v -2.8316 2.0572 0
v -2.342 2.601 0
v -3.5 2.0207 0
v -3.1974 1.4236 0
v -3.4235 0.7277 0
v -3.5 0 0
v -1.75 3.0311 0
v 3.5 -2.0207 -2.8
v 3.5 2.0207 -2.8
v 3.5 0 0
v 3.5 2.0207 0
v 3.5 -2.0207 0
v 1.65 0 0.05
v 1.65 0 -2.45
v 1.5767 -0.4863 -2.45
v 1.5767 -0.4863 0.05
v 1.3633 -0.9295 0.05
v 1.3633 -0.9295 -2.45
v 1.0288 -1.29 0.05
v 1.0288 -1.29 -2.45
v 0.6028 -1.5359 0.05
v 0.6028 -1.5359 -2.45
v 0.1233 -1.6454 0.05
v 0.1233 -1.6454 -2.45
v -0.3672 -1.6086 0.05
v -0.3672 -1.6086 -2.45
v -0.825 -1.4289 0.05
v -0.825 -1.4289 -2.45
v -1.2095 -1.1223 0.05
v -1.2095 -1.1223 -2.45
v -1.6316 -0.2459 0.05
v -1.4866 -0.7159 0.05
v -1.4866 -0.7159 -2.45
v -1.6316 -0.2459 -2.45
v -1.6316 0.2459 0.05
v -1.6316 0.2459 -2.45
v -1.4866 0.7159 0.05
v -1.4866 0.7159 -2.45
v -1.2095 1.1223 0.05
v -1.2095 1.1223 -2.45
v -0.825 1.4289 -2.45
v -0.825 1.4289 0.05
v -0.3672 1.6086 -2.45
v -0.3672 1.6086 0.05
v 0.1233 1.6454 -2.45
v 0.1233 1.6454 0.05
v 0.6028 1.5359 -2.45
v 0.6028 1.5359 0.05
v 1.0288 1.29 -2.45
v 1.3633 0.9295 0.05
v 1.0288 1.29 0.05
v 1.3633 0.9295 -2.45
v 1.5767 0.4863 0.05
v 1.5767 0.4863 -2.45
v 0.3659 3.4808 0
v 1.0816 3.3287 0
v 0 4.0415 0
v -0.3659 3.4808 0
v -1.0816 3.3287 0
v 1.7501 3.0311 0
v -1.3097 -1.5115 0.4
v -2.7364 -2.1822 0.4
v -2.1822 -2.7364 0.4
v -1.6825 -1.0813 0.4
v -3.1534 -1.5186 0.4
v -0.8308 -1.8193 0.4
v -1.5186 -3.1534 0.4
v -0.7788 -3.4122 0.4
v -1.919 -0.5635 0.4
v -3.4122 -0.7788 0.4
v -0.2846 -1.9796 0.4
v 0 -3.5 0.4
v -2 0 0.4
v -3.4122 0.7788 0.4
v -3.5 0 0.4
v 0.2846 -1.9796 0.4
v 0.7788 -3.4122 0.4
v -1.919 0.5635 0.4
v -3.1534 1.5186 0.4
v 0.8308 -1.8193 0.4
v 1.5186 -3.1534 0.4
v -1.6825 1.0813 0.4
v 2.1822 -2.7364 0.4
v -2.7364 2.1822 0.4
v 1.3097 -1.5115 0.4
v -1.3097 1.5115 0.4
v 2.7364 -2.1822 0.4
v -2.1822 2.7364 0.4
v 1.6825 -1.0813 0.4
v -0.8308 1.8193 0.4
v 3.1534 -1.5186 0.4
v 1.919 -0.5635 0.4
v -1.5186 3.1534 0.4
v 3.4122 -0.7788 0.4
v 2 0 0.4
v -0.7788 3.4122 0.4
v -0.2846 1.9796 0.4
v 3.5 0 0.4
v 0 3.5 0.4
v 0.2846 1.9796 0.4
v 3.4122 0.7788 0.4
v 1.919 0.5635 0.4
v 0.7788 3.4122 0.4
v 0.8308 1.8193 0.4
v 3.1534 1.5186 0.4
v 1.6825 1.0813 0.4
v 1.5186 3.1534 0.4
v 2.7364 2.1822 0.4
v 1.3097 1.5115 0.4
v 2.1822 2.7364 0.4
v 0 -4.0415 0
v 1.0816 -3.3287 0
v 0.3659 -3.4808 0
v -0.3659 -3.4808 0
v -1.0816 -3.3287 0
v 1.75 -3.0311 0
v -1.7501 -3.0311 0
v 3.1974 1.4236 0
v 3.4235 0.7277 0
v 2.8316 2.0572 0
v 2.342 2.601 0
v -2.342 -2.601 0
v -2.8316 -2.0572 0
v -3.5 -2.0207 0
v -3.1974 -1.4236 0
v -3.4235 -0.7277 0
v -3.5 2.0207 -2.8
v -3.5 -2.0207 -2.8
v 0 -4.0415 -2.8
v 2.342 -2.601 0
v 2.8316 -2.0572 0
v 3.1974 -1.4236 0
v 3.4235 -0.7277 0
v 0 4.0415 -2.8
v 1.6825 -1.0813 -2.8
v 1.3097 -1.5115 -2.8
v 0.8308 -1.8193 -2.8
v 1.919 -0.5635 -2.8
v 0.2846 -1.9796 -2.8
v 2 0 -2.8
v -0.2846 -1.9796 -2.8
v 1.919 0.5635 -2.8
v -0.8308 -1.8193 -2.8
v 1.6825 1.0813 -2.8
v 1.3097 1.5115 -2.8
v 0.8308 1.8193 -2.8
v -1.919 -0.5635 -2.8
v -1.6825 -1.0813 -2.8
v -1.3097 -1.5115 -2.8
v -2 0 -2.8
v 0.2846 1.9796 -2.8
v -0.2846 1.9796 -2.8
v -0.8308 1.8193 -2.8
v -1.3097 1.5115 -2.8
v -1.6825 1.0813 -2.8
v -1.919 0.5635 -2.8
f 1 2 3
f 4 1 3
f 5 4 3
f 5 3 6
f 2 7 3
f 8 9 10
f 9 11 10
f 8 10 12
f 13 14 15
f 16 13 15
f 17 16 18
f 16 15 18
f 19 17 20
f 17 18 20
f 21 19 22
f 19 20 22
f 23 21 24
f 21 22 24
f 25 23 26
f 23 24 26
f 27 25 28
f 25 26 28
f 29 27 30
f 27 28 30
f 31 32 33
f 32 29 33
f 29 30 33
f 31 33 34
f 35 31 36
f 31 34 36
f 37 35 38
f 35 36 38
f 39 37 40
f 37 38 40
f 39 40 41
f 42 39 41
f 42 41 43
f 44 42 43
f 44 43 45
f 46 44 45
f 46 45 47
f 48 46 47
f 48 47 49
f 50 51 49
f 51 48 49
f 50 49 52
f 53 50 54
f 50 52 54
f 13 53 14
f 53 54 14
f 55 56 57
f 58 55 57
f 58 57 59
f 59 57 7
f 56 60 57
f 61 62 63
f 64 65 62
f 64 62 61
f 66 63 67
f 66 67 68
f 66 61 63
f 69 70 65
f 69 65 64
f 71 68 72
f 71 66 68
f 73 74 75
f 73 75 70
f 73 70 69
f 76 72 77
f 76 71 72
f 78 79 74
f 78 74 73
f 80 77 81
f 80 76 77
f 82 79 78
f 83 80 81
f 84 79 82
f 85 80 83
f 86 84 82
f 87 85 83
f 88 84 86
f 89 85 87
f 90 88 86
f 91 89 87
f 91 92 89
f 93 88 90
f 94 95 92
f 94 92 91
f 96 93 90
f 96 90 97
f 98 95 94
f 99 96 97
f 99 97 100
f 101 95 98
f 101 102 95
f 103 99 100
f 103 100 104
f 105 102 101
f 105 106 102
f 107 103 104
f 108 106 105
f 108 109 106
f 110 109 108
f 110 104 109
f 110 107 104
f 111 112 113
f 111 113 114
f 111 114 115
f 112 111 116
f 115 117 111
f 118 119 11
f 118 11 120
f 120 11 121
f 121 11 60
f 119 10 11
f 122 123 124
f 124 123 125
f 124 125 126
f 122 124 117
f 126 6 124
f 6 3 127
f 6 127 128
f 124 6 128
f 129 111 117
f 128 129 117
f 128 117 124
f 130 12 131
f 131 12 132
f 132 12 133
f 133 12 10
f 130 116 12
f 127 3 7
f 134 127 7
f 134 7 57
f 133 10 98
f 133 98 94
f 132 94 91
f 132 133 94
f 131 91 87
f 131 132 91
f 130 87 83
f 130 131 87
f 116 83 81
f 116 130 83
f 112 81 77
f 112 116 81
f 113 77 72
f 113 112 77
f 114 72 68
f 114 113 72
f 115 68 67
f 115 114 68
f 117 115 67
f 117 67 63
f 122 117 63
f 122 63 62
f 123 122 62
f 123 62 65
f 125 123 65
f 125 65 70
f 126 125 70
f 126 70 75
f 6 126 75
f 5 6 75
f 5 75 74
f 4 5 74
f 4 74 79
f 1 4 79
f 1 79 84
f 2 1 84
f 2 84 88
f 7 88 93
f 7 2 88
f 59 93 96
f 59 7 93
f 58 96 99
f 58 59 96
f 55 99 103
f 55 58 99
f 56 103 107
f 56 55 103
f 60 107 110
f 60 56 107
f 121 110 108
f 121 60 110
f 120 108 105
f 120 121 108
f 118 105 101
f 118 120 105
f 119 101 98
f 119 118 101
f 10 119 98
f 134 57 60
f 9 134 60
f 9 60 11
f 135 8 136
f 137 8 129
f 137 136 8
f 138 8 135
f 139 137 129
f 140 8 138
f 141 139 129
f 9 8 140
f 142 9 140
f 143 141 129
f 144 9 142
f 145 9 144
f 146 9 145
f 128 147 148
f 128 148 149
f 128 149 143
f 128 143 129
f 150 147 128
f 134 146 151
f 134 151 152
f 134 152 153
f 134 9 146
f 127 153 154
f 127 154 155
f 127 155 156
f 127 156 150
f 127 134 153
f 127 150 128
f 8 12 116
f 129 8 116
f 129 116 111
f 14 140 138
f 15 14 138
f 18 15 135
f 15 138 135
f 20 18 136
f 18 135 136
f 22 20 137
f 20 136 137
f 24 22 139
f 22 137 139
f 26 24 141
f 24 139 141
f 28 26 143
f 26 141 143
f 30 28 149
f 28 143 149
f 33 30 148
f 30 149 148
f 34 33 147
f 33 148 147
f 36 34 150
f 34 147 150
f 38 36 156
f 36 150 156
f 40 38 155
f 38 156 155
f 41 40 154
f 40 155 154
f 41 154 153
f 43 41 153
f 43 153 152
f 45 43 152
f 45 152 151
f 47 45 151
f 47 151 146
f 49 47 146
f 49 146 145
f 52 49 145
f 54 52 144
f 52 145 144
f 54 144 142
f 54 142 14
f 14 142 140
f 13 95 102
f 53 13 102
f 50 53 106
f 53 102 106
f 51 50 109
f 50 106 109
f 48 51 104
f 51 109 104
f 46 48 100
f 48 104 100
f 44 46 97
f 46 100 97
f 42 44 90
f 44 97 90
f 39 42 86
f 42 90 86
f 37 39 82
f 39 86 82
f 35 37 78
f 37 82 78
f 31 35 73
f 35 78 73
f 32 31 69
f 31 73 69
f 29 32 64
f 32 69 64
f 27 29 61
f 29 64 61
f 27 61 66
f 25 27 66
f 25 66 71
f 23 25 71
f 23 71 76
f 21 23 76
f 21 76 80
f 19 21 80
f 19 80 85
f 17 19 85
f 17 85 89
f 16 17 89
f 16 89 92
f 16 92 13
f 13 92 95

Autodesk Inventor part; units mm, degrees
ref_plane "YZ Plane" through (0, 0, 0) normal (1, 0, 0) x (0, 1, 0)
ref_plane "XZ Plane" through (0, 0, 0) normal (0, 1, 0) x (-1, 0, 0)
ref_plane "XY Plane" through (0, 0, 0) normal (0, 0, 1) x (1, 0, 0)
sketch "Szkic1" plane through (0, 0, 0) normal (0, 0, 1) x (1, 0, 0)
  circle A0 centre (0, 0) radius 3.5
  circle A1 centre (0, 0) radius 1.65
  dimension "d0" = 7
  dimension "d1" = 3.3
extrude "Wyciągnięcie proste1" add sketch "Szkic1" along normal blind 0.4
chamfer "Faza1" distance 0.35 angle 45 1 edges at (-1.65, 0, 0.4)
sketch "Szkic2" plane through (0, 0, 0.4) normal (0, 0, 1) x (1, 0, 0)
  point P0 (0, 0)
sketch "Szkic3" plane through (0, 0, 0) normal (0, 0, -1) x (-1, 0, 0)
  circle A0 centre (0, 0) radius 1.65
  circle A1 centre (0, 0) radius 3.5
  circle A2 centre (0, 0) radius 3.5 projected
  line L0 (1.75, 3.0311) -> (3.5, 2.0207)
  line L1 (1.75, 3.0311) -> (0, 4.0415)
  line L2 (-1.75, 3.0311) -> (0, 4.0415)
  line L3 (-1.75, 3.0311) -> (-3.5, 2.0207)
  line L4 (-3.5, 0) -> (-3.5, 2.0207)
  line L5 (-3.5, 0) -> (-3.5, -2.0207)
  line L6 (-1.75, -3.0311) -> (-3.5, -2.0207)
  line L7 (-1.75, -3.0311) -> (0, -4.0415)
  line L8 (0, -4.0415) -> (1.75, -3.0311)
  line L9 (1.75, -3.0311) -> (3.5, -2.0207)
  line L10 (3.5, 0) -> (3.5, -2.0207)
  line L11 (3.5, 0) -> (3.5, 2.0207)
extrude "Wyciągnięcie proste2" add sketch "Szkic3" along normal blind 2.8 contours A0 | A1 | L10 L9 A1 | A1 L0 L11 | A1 L2 L1 | L8 L7 A1 | A1 L4 L3 | L6 L5 A1
sketch "Szkic4" plane through (0, 0, 0) normal (0, 0, 1) x (1, 0, 0)
  circle A0 centre (0, 0) radius 1.65
extrude "Wyciągnięcie proste3" cut sketch "Szkic4" against normal blind 2.8
chamfer "Faza2" distance 0.35 angle 45 1 edges at (-1.65, 0, -2.8)
sketch "Szkic5" plane through (0, 0, -2.8) normal (0, 0, -1) x (-1, 0, 0)
  circle A0 centre (0, 0) radius 3.5
  dimension "d18" = 7
sketch "Szkic6" plane through (0, 0, -2.8) normal (0, 0, -1) x (-1, 0, 0)
  line L0 (-3.5, 2.0207) -> (-3.5, -2.0207) projected
  line L1 (-3.5, -2.0207) -> (-3.5, 0)
  line L2 (-3.5, 2.0207) -> (-3.5, 0) projected
  line L3 (-3.5, 0) -> (-3.5, 2.0207)
  line L4 (-3.5, 2.0207) -> (-1.75, 3.0311)
  line L5 (0, 4.0415) -> (-3.5, 2.0207) projected
  line L6 (-1.75, 3.0311) -> (0, 4.0415)
  line L7 (0, 4.0415) -> (1.75, 3.0311)
  line L8 (3.5, 2.0207) -> (0, 4.0415) projected
  line L9 (1.75, 3.0311) -> (3.5, 2.0207)
  line L10 (3.5, 2.0207) -> (3.5, 0)
  line L11 (3.5, -2.0207) -> (3.5, 0) projected
  line L12 (3.5, 0) -> (3.5, -2.0207)
  arc A0 (-1.75, -3.0311) -> (1.75, -3.0311) centre (0, 0) ccw projected
  line L13 (3.5, -2.0207) -> (1.75, -3.0311)
  line L14 (-3.5, -2.0207) -> (0, -4.0415) projected
  line L15 (1.75, -3.0311) -> (0, -4.0415)
  line L16 (0, -4.0415) -> (-1.75, -3.0311)
  arc A1 (-3.5, 0) -> (-1.75, -3.0311) centre (0, 0) ccw projected
  line L17 (-1.75, -3.0311) -> (-3.5, -2.0207)
sketch "Szkic7" plane through (0, 0, -2.8) normal (0, 0, -1) x (-1, 0, 0)
  point P0 (0, 0)
properties part number "nakretka"
